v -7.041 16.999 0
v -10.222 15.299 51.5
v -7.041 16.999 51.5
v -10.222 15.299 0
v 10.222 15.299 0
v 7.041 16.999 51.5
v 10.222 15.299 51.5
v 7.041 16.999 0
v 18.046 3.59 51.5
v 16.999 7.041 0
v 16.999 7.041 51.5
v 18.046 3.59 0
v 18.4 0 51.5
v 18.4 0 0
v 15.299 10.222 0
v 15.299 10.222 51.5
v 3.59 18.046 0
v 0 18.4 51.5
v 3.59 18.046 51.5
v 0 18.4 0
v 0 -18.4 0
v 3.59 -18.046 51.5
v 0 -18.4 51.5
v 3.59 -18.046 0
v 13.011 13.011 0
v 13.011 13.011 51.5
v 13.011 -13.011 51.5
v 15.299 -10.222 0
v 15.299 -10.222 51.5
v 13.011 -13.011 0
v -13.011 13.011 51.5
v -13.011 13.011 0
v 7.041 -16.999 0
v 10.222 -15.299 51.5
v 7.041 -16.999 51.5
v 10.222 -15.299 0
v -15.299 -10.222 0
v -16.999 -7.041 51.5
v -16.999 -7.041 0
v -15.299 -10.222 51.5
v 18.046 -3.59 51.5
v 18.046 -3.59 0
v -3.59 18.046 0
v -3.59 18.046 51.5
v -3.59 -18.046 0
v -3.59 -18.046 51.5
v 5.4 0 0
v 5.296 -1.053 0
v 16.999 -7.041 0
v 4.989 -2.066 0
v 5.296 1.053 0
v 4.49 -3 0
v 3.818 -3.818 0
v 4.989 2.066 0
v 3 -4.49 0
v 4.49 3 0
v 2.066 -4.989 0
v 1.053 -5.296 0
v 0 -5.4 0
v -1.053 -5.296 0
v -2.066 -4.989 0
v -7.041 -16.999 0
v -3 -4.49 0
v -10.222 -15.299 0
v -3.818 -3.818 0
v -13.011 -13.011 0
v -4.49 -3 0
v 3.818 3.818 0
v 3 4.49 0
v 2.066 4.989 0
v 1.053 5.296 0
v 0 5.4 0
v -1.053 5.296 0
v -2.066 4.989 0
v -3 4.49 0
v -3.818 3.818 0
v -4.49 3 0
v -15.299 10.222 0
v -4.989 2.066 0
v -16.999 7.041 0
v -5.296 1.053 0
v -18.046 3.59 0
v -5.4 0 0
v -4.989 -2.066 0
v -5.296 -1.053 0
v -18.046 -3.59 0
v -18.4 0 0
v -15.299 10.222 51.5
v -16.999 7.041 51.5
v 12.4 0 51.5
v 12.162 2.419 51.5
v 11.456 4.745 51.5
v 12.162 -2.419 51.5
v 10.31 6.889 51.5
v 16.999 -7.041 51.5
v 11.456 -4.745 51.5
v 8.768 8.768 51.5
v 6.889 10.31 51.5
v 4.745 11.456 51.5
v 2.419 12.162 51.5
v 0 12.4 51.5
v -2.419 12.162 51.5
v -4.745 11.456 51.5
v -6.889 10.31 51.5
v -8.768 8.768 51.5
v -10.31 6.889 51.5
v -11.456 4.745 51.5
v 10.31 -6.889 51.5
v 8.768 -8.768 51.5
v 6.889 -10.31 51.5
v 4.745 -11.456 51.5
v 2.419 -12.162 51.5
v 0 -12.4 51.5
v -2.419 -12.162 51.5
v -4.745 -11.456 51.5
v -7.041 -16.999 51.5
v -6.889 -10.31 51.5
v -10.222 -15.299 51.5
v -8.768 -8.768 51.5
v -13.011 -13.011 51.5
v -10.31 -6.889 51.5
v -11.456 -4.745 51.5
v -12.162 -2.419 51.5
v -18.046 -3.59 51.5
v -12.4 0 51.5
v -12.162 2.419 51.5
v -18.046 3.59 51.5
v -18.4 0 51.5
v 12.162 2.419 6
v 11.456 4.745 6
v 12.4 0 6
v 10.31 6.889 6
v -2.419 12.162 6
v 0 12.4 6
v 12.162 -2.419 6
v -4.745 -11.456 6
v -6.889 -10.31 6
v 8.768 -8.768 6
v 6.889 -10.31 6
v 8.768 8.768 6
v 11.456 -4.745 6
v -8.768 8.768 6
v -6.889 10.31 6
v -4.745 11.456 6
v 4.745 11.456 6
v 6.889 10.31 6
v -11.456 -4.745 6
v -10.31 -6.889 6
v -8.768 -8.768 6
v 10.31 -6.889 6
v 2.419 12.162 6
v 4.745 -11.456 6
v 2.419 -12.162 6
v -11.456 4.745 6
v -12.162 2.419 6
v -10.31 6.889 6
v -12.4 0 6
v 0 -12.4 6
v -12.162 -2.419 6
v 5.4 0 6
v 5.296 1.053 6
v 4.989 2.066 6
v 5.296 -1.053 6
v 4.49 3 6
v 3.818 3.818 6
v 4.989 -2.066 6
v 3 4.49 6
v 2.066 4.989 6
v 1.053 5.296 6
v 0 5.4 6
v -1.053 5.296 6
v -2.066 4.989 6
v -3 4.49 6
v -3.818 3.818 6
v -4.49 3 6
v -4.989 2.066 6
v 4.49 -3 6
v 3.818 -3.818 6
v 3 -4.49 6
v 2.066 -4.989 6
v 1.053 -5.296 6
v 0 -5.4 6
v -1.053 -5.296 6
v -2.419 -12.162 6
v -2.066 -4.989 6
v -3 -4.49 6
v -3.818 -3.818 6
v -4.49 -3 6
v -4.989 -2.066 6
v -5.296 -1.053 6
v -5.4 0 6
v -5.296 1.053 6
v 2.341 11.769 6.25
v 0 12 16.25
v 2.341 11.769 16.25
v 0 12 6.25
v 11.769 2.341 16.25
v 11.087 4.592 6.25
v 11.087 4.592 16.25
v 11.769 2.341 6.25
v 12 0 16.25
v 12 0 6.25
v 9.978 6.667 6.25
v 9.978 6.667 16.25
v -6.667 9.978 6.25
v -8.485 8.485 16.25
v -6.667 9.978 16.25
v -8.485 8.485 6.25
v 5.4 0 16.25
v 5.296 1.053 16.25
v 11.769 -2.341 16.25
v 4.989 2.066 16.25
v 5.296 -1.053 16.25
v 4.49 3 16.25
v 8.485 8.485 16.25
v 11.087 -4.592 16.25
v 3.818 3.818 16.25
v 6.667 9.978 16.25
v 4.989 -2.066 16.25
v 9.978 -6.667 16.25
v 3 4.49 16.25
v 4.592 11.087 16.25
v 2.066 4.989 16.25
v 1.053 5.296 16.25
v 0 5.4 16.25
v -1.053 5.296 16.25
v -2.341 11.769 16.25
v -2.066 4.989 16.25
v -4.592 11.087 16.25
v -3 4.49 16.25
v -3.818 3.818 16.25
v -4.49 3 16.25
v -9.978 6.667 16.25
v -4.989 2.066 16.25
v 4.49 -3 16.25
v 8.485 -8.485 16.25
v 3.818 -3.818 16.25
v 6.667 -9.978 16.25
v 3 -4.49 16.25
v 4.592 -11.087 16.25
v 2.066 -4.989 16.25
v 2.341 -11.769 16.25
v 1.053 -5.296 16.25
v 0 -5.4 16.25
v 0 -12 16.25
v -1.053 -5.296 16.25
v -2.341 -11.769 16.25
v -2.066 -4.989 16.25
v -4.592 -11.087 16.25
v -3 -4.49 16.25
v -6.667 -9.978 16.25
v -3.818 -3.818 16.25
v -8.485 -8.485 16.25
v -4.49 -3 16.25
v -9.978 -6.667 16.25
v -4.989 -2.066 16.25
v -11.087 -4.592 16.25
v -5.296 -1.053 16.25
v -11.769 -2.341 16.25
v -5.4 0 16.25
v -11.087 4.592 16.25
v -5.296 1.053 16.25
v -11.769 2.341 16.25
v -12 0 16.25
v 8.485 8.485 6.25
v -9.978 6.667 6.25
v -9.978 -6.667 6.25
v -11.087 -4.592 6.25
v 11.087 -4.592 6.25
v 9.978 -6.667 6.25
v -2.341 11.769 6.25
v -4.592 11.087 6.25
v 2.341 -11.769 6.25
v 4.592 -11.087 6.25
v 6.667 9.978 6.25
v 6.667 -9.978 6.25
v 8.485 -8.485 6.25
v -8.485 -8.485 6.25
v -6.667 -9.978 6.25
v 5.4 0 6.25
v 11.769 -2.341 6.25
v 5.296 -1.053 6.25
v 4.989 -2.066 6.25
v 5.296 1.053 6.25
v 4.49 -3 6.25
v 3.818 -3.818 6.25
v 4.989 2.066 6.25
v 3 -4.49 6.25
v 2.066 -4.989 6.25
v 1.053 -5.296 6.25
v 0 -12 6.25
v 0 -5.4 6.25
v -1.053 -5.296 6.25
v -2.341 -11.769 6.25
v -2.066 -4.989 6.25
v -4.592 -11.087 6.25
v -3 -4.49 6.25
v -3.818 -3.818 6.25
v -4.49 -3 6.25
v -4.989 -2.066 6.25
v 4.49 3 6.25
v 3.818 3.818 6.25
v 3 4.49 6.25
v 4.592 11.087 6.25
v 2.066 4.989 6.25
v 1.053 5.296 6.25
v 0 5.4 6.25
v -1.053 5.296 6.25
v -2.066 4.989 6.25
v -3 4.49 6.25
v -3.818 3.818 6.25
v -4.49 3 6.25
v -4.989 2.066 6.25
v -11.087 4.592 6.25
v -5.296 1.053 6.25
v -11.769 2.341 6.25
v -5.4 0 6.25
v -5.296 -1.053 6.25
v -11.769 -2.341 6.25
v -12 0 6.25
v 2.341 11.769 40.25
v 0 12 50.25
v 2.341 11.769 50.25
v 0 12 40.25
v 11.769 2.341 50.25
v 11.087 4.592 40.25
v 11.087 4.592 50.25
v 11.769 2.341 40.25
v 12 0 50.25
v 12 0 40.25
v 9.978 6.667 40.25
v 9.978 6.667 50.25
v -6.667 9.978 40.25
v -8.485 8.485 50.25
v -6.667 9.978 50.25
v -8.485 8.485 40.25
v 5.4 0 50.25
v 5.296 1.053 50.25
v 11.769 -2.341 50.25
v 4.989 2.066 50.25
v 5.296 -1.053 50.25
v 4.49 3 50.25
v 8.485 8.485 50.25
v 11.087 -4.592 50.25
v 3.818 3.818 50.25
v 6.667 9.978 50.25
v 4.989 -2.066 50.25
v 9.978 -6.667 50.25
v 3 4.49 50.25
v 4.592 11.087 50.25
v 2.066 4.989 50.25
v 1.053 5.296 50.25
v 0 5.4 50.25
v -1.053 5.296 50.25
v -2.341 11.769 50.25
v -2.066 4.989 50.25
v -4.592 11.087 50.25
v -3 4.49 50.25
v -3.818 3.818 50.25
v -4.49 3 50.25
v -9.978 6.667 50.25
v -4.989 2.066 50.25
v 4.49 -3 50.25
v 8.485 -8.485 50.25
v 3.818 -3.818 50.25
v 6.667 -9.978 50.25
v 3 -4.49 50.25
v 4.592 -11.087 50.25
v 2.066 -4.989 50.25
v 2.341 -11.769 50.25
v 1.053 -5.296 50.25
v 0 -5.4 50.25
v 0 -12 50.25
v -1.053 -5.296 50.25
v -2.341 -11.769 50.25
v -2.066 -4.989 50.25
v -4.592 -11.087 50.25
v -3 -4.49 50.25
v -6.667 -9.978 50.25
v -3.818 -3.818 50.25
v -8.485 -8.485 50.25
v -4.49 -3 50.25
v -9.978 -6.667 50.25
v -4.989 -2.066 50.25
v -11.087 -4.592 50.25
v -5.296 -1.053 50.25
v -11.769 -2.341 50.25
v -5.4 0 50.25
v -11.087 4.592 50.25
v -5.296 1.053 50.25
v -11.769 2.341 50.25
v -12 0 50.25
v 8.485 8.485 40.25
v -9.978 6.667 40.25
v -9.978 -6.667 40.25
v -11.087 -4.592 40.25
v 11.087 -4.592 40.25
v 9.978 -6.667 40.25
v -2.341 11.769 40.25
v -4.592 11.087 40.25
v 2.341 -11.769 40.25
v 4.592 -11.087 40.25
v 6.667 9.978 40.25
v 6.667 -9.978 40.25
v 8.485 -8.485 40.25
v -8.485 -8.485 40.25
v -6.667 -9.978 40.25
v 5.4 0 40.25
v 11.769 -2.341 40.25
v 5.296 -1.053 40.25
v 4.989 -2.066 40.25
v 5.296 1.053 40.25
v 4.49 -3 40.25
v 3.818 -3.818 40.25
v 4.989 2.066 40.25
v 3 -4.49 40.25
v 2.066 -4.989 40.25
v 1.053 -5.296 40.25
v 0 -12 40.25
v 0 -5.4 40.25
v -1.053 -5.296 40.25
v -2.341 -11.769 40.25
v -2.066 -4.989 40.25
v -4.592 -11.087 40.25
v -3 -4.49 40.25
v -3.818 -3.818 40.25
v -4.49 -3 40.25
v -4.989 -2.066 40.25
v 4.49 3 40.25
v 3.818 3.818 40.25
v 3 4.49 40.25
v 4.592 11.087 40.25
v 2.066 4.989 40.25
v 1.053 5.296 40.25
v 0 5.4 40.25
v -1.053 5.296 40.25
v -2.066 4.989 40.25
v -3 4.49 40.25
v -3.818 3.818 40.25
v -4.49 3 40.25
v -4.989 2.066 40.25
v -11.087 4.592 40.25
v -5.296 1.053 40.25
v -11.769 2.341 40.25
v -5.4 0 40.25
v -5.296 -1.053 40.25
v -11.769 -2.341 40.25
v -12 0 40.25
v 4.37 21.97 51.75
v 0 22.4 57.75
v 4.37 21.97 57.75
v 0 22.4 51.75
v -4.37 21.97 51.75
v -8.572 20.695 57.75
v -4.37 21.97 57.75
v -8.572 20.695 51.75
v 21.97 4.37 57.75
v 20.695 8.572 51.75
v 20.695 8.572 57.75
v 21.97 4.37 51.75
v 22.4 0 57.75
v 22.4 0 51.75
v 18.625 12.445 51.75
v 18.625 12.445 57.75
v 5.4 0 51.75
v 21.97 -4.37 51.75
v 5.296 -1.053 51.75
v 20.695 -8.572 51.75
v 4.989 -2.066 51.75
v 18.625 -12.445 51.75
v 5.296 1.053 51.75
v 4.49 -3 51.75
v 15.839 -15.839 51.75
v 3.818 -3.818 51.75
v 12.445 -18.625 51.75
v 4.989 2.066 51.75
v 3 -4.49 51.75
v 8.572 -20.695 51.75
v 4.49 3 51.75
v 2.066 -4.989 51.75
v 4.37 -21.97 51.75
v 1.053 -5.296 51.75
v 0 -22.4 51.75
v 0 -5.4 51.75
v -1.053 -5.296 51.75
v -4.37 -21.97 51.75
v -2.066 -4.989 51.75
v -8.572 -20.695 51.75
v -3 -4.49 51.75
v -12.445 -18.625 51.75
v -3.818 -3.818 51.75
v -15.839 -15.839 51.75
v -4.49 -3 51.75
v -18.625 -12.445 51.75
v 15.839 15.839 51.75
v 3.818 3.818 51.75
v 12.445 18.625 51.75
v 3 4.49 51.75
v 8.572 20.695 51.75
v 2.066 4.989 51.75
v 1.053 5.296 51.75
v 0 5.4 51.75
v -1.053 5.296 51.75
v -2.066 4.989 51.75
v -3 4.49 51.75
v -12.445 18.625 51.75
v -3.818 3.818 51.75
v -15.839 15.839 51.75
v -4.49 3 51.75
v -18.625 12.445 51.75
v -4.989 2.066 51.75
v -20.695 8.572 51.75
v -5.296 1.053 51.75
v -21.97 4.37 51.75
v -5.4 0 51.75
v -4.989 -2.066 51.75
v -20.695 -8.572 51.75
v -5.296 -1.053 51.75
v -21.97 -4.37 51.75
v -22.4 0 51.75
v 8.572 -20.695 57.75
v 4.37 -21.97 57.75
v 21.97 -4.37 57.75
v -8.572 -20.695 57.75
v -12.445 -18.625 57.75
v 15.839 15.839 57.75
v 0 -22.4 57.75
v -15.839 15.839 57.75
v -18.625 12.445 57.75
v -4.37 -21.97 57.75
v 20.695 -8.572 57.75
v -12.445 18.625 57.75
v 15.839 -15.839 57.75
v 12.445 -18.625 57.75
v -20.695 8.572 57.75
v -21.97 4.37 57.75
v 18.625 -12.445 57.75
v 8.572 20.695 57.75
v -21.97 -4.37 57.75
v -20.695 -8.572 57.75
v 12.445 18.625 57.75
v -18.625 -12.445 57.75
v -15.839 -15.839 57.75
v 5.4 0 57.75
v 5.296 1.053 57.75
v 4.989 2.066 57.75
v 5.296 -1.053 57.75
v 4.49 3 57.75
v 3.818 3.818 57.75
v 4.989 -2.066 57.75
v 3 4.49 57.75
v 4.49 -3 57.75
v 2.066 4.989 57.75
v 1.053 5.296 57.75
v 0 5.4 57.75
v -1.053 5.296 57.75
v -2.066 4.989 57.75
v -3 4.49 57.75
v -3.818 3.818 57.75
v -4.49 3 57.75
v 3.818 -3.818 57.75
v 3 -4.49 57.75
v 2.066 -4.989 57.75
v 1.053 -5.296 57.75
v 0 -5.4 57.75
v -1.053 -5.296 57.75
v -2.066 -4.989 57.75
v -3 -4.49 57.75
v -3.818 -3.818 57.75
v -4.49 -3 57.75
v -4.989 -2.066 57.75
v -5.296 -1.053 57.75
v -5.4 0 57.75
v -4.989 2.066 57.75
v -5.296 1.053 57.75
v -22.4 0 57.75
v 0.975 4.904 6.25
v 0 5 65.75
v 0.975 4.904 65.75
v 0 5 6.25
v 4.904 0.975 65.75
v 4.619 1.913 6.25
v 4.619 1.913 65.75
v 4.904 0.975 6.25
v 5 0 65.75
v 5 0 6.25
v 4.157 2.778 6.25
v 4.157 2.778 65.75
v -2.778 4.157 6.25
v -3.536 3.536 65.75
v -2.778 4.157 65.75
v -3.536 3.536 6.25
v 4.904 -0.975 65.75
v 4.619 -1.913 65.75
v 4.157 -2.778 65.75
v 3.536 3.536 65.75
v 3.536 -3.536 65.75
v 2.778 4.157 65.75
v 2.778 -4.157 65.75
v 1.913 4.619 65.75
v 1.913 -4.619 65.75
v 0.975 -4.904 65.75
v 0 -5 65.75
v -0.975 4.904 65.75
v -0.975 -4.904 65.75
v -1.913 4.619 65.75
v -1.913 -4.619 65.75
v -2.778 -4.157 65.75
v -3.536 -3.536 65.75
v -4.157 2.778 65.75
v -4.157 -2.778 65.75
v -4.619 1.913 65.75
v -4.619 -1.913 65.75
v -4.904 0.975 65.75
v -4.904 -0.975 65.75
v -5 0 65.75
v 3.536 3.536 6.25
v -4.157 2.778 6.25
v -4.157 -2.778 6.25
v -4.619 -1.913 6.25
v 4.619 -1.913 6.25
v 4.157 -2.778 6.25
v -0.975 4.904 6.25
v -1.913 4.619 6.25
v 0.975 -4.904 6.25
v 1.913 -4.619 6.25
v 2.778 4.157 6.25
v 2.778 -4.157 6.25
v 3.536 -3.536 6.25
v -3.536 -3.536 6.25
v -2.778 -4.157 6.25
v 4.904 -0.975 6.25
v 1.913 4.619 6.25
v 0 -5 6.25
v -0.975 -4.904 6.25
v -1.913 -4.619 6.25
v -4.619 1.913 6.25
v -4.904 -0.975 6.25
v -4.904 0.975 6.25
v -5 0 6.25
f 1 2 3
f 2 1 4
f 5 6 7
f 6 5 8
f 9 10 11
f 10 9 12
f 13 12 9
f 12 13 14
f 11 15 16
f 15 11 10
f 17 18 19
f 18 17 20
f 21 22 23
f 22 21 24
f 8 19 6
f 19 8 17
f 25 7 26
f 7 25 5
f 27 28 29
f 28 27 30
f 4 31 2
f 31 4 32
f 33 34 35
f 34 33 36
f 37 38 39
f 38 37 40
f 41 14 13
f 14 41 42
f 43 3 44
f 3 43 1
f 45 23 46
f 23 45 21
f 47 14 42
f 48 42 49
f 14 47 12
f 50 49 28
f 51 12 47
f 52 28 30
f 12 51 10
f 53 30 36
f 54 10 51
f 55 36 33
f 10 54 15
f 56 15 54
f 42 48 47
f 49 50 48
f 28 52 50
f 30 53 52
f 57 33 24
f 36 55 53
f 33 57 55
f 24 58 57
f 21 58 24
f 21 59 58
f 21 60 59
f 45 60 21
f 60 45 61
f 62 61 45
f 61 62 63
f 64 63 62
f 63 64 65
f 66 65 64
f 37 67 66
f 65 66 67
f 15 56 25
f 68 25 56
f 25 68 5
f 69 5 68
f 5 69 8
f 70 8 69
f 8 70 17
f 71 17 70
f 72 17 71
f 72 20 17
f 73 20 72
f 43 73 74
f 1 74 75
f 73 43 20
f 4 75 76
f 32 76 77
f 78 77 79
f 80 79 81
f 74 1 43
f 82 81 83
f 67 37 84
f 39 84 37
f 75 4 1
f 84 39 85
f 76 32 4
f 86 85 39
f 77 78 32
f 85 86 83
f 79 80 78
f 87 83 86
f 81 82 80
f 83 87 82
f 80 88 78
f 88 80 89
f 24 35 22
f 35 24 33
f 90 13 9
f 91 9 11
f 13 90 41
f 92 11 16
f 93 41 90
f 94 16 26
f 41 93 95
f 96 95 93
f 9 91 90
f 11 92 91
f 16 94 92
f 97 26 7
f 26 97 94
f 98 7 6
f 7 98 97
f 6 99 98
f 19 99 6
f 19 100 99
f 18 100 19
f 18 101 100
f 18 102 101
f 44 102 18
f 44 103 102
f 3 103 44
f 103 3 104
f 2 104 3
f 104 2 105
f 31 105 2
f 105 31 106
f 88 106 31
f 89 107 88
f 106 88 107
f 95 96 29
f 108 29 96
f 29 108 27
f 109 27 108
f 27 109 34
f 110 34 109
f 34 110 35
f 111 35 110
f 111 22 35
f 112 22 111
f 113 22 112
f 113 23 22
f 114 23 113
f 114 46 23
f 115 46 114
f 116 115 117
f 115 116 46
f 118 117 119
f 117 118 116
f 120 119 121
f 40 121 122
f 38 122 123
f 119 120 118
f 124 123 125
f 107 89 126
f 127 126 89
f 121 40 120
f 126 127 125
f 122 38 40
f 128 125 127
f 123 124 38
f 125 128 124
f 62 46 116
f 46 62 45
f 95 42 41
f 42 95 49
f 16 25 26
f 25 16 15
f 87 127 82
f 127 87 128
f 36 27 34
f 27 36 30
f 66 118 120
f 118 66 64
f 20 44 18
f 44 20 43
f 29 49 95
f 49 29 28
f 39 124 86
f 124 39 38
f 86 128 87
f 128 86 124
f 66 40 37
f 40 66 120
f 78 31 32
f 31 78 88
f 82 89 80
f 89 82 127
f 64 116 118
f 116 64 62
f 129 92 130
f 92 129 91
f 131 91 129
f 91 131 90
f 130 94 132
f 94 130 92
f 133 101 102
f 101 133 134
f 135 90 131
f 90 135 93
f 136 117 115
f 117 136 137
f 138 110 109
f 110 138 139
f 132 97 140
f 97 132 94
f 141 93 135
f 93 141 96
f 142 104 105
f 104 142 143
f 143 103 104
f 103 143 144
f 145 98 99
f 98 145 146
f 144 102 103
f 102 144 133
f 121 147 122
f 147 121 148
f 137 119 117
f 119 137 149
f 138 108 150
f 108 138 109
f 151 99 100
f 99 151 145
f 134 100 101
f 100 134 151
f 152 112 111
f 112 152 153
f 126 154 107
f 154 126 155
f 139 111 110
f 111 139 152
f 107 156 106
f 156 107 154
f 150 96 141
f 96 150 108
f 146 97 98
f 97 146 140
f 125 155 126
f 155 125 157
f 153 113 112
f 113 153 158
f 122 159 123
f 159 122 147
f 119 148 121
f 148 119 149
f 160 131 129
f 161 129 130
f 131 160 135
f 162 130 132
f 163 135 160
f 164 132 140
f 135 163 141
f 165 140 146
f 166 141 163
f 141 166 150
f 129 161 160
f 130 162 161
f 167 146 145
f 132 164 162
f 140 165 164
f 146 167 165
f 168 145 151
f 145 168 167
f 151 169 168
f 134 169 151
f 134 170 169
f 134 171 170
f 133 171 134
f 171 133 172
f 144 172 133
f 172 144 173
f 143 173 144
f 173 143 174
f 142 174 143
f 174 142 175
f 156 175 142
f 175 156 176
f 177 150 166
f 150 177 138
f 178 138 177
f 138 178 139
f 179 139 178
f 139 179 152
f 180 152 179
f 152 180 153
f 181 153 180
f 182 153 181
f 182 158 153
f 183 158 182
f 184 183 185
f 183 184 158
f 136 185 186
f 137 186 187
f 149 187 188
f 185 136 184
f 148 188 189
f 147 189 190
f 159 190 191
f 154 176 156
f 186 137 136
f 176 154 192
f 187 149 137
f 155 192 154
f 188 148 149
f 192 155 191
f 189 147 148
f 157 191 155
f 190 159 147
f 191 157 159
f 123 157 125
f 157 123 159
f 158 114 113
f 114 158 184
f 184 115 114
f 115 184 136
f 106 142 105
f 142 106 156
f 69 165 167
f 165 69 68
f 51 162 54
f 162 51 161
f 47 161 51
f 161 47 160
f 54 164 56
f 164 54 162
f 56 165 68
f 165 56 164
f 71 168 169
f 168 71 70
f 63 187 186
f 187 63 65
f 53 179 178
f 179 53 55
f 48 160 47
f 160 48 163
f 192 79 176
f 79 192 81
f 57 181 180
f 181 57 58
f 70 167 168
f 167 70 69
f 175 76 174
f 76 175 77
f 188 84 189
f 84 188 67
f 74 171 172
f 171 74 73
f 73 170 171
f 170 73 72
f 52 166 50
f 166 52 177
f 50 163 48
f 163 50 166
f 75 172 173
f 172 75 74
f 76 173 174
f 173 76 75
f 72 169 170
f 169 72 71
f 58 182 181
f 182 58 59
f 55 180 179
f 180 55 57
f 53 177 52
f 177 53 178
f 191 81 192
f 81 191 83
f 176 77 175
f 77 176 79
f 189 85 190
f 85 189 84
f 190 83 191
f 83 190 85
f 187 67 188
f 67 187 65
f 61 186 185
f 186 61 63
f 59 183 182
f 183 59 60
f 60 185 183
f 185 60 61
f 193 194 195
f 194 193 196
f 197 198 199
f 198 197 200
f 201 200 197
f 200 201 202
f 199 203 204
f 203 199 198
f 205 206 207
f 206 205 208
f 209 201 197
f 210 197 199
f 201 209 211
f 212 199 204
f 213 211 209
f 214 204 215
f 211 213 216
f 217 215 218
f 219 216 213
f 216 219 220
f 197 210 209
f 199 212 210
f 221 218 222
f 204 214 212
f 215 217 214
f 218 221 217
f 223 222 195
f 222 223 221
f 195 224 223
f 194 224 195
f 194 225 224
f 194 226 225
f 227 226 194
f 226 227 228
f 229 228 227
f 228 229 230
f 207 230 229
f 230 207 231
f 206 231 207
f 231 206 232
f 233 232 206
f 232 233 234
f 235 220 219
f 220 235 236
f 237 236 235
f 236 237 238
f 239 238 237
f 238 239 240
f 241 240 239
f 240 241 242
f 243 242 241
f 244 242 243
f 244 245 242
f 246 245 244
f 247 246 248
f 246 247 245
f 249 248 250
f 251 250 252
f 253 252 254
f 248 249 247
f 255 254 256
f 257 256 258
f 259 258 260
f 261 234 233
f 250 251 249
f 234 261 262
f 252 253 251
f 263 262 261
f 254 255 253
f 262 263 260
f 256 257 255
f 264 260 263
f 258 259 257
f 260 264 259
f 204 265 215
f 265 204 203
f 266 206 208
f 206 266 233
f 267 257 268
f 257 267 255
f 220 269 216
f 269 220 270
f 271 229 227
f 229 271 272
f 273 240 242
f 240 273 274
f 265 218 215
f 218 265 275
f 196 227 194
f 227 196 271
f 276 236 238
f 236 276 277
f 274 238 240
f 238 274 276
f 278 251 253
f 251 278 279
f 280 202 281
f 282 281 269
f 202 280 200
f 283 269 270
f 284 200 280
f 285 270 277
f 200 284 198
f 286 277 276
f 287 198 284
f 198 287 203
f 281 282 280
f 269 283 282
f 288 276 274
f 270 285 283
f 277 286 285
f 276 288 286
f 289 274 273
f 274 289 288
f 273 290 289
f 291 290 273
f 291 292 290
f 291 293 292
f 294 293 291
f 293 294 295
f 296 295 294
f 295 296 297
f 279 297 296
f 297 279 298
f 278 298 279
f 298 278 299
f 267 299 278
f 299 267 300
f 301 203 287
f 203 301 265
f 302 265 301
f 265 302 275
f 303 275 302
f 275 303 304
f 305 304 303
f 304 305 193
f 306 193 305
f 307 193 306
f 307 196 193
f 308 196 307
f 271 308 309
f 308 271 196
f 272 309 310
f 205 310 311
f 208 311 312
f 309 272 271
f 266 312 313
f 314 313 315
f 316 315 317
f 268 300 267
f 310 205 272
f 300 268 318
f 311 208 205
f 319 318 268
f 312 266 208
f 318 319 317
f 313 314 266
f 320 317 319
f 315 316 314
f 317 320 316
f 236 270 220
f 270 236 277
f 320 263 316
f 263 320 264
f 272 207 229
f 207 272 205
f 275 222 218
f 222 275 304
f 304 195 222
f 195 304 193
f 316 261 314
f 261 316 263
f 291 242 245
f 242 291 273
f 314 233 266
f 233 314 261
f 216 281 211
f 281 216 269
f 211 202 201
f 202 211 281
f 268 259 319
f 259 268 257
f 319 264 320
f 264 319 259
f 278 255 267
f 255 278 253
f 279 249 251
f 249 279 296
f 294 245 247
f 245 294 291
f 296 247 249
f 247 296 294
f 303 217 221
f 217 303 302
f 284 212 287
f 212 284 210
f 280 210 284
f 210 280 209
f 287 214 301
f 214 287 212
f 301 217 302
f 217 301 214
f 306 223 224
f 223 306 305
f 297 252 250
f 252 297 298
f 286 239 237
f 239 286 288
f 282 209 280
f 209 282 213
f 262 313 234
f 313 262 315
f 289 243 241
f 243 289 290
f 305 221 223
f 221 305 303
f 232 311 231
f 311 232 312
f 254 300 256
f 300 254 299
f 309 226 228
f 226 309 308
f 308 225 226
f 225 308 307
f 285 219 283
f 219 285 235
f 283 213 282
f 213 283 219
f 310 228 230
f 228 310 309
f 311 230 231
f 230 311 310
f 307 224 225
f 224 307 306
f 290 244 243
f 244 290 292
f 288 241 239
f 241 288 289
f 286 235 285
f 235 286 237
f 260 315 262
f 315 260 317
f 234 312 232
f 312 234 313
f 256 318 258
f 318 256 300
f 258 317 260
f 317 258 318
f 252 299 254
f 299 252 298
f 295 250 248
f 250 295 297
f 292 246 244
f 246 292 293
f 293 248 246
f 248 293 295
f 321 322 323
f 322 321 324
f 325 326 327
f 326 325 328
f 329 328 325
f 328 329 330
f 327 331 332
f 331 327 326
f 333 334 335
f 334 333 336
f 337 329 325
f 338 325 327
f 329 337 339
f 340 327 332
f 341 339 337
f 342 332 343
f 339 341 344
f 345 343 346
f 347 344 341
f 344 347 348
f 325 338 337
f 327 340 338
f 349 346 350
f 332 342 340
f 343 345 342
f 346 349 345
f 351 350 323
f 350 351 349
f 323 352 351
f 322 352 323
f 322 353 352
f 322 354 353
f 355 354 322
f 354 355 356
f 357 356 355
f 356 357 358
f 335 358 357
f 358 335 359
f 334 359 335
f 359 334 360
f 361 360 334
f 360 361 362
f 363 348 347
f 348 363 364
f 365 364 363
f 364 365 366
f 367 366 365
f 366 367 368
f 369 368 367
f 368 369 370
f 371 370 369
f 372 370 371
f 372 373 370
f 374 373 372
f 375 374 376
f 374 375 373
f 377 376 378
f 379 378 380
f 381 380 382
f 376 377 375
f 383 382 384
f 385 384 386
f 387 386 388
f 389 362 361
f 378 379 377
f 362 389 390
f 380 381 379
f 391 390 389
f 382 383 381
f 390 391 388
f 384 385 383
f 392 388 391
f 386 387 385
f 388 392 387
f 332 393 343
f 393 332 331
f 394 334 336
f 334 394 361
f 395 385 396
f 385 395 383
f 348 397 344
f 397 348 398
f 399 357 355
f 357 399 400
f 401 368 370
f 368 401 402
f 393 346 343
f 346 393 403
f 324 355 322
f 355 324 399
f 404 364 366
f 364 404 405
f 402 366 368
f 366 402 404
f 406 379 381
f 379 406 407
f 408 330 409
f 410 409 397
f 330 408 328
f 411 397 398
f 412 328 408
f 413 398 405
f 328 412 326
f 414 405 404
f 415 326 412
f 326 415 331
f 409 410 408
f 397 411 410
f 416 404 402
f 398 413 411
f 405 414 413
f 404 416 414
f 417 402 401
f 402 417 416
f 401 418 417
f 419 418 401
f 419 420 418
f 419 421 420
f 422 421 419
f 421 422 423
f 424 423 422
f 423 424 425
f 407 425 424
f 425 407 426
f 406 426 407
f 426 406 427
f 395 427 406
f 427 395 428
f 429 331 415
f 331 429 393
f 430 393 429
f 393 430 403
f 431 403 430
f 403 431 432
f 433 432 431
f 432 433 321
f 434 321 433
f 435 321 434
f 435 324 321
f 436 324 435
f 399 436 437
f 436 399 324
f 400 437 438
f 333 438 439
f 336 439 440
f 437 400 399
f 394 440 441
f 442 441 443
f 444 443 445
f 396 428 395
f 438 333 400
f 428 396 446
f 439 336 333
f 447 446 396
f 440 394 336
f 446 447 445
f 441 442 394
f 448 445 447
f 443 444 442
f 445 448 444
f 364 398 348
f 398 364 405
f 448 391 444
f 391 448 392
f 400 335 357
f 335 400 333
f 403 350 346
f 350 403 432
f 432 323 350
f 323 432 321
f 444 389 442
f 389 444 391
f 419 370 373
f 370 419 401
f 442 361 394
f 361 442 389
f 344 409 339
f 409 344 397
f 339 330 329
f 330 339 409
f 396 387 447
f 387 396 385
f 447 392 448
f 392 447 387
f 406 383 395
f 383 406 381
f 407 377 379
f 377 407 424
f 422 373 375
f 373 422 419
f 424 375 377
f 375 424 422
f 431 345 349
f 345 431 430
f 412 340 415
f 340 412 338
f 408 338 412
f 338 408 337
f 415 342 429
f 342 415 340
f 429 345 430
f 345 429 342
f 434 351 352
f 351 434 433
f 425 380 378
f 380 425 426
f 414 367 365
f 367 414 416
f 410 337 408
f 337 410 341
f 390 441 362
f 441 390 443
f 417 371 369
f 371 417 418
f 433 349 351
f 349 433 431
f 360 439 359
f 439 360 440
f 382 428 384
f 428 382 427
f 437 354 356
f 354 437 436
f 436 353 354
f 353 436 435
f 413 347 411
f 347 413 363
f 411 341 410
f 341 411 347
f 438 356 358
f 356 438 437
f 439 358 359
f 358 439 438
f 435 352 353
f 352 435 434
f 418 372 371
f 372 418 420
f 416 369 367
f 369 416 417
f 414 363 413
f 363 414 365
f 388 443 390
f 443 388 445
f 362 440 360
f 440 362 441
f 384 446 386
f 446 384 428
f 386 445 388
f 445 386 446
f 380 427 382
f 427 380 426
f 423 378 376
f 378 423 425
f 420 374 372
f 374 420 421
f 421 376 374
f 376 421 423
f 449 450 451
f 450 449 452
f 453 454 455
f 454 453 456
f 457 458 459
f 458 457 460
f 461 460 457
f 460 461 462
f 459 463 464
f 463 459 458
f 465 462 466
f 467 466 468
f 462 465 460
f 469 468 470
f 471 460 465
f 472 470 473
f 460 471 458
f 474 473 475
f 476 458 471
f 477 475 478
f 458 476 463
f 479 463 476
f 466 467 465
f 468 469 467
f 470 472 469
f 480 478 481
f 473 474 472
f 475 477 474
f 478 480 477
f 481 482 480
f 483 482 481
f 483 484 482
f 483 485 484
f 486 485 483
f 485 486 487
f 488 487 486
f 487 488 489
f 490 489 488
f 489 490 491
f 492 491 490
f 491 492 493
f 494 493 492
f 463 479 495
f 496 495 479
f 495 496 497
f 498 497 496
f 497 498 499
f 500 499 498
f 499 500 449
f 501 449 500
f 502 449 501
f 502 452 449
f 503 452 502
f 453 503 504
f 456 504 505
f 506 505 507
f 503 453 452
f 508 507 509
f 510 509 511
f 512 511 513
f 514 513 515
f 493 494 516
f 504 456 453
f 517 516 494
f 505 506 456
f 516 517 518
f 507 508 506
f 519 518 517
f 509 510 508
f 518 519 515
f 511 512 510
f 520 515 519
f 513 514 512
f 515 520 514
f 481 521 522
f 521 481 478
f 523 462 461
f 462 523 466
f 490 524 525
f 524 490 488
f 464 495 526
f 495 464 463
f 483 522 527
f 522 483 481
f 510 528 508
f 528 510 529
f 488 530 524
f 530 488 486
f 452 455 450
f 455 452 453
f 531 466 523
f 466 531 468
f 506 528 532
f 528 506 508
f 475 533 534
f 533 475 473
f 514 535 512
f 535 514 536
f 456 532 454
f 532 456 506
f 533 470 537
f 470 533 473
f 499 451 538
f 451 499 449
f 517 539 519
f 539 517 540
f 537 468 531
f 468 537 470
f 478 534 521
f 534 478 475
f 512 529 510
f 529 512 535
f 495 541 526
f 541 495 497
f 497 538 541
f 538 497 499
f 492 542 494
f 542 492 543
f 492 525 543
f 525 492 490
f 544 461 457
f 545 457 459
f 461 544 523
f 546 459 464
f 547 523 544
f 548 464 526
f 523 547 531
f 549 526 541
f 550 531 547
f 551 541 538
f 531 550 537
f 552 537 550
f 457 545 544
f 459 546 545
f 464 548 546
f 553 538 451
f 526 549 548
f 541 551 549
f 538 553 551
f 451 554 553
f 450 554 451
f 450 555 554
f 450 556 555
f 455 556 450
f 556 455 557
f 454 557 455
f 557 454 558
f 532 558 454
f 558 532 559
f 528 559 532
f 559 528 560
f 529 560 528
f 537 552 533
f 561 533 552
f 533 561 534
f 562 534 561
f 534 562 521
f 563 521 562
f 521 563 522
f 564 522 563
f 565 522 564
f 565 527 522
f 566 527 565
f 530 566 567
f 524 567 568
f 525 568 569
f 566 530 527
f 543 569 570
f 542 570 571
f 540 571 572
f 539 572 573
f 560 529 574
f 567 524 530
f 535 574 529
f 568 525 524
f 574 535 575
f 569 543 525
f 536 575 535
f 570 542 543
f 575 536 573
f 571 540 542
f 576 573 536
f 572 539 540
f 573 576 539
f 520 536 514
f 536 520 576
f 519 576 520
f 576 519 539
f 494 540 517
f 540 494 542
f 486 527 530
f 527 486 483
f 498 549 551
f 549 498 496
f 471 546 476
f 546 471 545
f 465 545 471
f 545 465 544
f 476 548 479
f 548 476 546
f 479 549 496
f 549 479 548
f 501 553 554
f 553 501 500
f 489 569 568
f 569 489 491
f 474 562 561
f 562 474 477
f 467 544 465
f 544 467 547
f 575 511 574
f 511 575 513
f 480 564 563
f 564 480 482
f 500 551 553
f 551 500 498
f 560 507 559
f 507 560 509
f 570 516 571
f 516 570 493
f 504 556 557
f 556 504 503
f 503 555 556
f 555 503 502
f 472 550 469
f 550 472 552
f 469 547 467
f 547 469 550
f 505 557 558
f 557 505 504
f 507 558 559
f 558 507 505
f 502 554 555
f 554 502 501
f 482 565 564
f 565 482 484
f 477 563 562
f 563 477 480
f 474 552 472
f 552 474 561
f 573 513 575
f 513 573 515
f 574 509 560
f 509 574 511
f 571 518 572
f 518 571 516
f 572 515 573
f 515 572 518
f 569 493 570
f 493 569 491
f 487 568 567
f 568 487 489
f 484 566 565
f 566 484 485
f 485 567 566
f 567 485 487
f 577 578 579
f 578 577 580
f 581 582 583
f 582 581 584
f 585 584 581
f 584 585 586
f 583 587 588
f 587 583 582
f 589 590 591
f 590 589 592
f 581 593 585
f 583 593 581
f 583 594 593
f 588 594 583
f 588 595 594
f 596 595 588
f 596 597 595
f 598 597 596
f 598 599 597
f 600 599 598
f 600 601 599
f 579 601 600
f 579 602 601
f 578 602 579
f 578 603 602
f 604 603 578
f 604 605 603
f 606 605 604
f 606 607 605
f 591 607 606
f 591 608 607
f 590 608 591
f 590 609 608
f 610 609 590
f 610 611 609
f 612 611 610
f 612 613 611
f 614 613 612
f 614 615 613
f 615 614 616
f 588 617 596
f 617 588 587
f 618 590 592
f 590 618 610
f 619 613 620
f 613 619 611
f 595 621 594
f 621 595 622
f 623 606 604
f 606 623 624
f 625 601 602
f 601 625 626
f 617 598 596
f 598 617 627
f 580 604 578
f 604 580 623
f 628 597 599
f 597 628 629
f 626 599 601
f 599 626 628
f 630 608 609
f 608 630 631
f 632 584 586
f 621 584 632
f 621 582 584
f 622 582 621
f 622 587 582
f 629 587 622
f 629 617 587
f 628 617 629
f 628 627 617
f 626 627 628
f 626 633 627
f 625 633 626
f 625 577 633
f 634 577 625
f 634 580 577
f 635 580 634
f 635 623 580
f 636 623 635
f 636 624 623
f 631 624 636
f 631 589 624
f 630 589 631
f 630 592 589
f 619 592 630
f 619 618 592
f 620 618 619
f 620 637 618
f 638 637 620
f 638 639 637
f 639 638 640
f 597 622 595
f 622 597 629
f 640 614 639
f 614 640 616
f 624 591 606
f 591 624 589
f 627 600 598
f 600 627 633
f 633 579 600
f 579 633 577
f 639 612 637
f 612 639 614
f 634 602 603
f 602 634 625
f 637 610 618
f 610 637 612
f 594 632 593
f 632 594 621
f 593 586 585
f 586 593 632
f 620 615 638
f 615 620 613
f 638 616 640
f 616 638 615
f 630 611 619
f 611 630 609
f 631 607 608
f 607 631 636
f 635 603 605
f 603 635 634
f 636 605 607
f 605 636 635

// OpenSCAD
$fn = 32;

// ------------------------------------------------------------------------
// Shaft station: cup d36.8 x 51.5 mm, shaft d10
// Every part is its own module, assembly() places every instance.
// ------------------------------------------------------------------------

// --- part 1 ---
module housing_cup() {
  difference() {
    cylinder(h = 51.5, d = 36.8);
    translate([0, 0, 6]) cylinder(h = 46.5, d = 24.8);
    translate([0, 0, -1]) cylinder(h = 8, d = 10.8);
  }
}

// --- part 2 ---
module bearing_lower() {
  difference() {
      translate([0, 0, 0]) cylinder(h = 10, d = 24);
      translate([0, 0, -1]) cylinder(h = 12, d = 10.8);
    }
}

// --- part 3 ---
module bearing_upper() {
  difference() {
      translate([0, 0, 0]) cylinder(h = 10, d = 24);
      translate([0, 0, -1]) cylinder(h = 12, d = 10.8);
    }
}

// --- part 4 ---
module station_shaft() {
  translate([0, 0, -29.75]) cylinder(h = 59.5, d = 10);
}

// --- part 5 ---
module station_cover() {
  difference() {
    cylinder(h = 6, d = 44.8);
    translate([0, 0, -1]) cylinder(h = 8, d = 10.8);
  }
}

// --- assembly ---
module assembly() {
  color([0.80, 0.24, 0.20]) translate([0, 0, 0]) rotate([0, 0, 0]) housing_cup();
  color([0.20, 0.45, 0.75]) translate([0, 0, 6.25]) rotate([0, 0, 0]) bearing_lower();
  color([0.25, 0.62, 0.32]) translate([0, 0, 40.25]) rotate([0, 0, 0]) bearing_upper();
  color([0.92, 0.70, 0.18]) translate([0, 0, 36]) rotate([0, 0, 0]) station_shaft();
  color([0.58, 0.35, 0.70]) translate([0, 0, 51.75]) rotate([0, 0, 0]) station_cover();
}

assembly();
